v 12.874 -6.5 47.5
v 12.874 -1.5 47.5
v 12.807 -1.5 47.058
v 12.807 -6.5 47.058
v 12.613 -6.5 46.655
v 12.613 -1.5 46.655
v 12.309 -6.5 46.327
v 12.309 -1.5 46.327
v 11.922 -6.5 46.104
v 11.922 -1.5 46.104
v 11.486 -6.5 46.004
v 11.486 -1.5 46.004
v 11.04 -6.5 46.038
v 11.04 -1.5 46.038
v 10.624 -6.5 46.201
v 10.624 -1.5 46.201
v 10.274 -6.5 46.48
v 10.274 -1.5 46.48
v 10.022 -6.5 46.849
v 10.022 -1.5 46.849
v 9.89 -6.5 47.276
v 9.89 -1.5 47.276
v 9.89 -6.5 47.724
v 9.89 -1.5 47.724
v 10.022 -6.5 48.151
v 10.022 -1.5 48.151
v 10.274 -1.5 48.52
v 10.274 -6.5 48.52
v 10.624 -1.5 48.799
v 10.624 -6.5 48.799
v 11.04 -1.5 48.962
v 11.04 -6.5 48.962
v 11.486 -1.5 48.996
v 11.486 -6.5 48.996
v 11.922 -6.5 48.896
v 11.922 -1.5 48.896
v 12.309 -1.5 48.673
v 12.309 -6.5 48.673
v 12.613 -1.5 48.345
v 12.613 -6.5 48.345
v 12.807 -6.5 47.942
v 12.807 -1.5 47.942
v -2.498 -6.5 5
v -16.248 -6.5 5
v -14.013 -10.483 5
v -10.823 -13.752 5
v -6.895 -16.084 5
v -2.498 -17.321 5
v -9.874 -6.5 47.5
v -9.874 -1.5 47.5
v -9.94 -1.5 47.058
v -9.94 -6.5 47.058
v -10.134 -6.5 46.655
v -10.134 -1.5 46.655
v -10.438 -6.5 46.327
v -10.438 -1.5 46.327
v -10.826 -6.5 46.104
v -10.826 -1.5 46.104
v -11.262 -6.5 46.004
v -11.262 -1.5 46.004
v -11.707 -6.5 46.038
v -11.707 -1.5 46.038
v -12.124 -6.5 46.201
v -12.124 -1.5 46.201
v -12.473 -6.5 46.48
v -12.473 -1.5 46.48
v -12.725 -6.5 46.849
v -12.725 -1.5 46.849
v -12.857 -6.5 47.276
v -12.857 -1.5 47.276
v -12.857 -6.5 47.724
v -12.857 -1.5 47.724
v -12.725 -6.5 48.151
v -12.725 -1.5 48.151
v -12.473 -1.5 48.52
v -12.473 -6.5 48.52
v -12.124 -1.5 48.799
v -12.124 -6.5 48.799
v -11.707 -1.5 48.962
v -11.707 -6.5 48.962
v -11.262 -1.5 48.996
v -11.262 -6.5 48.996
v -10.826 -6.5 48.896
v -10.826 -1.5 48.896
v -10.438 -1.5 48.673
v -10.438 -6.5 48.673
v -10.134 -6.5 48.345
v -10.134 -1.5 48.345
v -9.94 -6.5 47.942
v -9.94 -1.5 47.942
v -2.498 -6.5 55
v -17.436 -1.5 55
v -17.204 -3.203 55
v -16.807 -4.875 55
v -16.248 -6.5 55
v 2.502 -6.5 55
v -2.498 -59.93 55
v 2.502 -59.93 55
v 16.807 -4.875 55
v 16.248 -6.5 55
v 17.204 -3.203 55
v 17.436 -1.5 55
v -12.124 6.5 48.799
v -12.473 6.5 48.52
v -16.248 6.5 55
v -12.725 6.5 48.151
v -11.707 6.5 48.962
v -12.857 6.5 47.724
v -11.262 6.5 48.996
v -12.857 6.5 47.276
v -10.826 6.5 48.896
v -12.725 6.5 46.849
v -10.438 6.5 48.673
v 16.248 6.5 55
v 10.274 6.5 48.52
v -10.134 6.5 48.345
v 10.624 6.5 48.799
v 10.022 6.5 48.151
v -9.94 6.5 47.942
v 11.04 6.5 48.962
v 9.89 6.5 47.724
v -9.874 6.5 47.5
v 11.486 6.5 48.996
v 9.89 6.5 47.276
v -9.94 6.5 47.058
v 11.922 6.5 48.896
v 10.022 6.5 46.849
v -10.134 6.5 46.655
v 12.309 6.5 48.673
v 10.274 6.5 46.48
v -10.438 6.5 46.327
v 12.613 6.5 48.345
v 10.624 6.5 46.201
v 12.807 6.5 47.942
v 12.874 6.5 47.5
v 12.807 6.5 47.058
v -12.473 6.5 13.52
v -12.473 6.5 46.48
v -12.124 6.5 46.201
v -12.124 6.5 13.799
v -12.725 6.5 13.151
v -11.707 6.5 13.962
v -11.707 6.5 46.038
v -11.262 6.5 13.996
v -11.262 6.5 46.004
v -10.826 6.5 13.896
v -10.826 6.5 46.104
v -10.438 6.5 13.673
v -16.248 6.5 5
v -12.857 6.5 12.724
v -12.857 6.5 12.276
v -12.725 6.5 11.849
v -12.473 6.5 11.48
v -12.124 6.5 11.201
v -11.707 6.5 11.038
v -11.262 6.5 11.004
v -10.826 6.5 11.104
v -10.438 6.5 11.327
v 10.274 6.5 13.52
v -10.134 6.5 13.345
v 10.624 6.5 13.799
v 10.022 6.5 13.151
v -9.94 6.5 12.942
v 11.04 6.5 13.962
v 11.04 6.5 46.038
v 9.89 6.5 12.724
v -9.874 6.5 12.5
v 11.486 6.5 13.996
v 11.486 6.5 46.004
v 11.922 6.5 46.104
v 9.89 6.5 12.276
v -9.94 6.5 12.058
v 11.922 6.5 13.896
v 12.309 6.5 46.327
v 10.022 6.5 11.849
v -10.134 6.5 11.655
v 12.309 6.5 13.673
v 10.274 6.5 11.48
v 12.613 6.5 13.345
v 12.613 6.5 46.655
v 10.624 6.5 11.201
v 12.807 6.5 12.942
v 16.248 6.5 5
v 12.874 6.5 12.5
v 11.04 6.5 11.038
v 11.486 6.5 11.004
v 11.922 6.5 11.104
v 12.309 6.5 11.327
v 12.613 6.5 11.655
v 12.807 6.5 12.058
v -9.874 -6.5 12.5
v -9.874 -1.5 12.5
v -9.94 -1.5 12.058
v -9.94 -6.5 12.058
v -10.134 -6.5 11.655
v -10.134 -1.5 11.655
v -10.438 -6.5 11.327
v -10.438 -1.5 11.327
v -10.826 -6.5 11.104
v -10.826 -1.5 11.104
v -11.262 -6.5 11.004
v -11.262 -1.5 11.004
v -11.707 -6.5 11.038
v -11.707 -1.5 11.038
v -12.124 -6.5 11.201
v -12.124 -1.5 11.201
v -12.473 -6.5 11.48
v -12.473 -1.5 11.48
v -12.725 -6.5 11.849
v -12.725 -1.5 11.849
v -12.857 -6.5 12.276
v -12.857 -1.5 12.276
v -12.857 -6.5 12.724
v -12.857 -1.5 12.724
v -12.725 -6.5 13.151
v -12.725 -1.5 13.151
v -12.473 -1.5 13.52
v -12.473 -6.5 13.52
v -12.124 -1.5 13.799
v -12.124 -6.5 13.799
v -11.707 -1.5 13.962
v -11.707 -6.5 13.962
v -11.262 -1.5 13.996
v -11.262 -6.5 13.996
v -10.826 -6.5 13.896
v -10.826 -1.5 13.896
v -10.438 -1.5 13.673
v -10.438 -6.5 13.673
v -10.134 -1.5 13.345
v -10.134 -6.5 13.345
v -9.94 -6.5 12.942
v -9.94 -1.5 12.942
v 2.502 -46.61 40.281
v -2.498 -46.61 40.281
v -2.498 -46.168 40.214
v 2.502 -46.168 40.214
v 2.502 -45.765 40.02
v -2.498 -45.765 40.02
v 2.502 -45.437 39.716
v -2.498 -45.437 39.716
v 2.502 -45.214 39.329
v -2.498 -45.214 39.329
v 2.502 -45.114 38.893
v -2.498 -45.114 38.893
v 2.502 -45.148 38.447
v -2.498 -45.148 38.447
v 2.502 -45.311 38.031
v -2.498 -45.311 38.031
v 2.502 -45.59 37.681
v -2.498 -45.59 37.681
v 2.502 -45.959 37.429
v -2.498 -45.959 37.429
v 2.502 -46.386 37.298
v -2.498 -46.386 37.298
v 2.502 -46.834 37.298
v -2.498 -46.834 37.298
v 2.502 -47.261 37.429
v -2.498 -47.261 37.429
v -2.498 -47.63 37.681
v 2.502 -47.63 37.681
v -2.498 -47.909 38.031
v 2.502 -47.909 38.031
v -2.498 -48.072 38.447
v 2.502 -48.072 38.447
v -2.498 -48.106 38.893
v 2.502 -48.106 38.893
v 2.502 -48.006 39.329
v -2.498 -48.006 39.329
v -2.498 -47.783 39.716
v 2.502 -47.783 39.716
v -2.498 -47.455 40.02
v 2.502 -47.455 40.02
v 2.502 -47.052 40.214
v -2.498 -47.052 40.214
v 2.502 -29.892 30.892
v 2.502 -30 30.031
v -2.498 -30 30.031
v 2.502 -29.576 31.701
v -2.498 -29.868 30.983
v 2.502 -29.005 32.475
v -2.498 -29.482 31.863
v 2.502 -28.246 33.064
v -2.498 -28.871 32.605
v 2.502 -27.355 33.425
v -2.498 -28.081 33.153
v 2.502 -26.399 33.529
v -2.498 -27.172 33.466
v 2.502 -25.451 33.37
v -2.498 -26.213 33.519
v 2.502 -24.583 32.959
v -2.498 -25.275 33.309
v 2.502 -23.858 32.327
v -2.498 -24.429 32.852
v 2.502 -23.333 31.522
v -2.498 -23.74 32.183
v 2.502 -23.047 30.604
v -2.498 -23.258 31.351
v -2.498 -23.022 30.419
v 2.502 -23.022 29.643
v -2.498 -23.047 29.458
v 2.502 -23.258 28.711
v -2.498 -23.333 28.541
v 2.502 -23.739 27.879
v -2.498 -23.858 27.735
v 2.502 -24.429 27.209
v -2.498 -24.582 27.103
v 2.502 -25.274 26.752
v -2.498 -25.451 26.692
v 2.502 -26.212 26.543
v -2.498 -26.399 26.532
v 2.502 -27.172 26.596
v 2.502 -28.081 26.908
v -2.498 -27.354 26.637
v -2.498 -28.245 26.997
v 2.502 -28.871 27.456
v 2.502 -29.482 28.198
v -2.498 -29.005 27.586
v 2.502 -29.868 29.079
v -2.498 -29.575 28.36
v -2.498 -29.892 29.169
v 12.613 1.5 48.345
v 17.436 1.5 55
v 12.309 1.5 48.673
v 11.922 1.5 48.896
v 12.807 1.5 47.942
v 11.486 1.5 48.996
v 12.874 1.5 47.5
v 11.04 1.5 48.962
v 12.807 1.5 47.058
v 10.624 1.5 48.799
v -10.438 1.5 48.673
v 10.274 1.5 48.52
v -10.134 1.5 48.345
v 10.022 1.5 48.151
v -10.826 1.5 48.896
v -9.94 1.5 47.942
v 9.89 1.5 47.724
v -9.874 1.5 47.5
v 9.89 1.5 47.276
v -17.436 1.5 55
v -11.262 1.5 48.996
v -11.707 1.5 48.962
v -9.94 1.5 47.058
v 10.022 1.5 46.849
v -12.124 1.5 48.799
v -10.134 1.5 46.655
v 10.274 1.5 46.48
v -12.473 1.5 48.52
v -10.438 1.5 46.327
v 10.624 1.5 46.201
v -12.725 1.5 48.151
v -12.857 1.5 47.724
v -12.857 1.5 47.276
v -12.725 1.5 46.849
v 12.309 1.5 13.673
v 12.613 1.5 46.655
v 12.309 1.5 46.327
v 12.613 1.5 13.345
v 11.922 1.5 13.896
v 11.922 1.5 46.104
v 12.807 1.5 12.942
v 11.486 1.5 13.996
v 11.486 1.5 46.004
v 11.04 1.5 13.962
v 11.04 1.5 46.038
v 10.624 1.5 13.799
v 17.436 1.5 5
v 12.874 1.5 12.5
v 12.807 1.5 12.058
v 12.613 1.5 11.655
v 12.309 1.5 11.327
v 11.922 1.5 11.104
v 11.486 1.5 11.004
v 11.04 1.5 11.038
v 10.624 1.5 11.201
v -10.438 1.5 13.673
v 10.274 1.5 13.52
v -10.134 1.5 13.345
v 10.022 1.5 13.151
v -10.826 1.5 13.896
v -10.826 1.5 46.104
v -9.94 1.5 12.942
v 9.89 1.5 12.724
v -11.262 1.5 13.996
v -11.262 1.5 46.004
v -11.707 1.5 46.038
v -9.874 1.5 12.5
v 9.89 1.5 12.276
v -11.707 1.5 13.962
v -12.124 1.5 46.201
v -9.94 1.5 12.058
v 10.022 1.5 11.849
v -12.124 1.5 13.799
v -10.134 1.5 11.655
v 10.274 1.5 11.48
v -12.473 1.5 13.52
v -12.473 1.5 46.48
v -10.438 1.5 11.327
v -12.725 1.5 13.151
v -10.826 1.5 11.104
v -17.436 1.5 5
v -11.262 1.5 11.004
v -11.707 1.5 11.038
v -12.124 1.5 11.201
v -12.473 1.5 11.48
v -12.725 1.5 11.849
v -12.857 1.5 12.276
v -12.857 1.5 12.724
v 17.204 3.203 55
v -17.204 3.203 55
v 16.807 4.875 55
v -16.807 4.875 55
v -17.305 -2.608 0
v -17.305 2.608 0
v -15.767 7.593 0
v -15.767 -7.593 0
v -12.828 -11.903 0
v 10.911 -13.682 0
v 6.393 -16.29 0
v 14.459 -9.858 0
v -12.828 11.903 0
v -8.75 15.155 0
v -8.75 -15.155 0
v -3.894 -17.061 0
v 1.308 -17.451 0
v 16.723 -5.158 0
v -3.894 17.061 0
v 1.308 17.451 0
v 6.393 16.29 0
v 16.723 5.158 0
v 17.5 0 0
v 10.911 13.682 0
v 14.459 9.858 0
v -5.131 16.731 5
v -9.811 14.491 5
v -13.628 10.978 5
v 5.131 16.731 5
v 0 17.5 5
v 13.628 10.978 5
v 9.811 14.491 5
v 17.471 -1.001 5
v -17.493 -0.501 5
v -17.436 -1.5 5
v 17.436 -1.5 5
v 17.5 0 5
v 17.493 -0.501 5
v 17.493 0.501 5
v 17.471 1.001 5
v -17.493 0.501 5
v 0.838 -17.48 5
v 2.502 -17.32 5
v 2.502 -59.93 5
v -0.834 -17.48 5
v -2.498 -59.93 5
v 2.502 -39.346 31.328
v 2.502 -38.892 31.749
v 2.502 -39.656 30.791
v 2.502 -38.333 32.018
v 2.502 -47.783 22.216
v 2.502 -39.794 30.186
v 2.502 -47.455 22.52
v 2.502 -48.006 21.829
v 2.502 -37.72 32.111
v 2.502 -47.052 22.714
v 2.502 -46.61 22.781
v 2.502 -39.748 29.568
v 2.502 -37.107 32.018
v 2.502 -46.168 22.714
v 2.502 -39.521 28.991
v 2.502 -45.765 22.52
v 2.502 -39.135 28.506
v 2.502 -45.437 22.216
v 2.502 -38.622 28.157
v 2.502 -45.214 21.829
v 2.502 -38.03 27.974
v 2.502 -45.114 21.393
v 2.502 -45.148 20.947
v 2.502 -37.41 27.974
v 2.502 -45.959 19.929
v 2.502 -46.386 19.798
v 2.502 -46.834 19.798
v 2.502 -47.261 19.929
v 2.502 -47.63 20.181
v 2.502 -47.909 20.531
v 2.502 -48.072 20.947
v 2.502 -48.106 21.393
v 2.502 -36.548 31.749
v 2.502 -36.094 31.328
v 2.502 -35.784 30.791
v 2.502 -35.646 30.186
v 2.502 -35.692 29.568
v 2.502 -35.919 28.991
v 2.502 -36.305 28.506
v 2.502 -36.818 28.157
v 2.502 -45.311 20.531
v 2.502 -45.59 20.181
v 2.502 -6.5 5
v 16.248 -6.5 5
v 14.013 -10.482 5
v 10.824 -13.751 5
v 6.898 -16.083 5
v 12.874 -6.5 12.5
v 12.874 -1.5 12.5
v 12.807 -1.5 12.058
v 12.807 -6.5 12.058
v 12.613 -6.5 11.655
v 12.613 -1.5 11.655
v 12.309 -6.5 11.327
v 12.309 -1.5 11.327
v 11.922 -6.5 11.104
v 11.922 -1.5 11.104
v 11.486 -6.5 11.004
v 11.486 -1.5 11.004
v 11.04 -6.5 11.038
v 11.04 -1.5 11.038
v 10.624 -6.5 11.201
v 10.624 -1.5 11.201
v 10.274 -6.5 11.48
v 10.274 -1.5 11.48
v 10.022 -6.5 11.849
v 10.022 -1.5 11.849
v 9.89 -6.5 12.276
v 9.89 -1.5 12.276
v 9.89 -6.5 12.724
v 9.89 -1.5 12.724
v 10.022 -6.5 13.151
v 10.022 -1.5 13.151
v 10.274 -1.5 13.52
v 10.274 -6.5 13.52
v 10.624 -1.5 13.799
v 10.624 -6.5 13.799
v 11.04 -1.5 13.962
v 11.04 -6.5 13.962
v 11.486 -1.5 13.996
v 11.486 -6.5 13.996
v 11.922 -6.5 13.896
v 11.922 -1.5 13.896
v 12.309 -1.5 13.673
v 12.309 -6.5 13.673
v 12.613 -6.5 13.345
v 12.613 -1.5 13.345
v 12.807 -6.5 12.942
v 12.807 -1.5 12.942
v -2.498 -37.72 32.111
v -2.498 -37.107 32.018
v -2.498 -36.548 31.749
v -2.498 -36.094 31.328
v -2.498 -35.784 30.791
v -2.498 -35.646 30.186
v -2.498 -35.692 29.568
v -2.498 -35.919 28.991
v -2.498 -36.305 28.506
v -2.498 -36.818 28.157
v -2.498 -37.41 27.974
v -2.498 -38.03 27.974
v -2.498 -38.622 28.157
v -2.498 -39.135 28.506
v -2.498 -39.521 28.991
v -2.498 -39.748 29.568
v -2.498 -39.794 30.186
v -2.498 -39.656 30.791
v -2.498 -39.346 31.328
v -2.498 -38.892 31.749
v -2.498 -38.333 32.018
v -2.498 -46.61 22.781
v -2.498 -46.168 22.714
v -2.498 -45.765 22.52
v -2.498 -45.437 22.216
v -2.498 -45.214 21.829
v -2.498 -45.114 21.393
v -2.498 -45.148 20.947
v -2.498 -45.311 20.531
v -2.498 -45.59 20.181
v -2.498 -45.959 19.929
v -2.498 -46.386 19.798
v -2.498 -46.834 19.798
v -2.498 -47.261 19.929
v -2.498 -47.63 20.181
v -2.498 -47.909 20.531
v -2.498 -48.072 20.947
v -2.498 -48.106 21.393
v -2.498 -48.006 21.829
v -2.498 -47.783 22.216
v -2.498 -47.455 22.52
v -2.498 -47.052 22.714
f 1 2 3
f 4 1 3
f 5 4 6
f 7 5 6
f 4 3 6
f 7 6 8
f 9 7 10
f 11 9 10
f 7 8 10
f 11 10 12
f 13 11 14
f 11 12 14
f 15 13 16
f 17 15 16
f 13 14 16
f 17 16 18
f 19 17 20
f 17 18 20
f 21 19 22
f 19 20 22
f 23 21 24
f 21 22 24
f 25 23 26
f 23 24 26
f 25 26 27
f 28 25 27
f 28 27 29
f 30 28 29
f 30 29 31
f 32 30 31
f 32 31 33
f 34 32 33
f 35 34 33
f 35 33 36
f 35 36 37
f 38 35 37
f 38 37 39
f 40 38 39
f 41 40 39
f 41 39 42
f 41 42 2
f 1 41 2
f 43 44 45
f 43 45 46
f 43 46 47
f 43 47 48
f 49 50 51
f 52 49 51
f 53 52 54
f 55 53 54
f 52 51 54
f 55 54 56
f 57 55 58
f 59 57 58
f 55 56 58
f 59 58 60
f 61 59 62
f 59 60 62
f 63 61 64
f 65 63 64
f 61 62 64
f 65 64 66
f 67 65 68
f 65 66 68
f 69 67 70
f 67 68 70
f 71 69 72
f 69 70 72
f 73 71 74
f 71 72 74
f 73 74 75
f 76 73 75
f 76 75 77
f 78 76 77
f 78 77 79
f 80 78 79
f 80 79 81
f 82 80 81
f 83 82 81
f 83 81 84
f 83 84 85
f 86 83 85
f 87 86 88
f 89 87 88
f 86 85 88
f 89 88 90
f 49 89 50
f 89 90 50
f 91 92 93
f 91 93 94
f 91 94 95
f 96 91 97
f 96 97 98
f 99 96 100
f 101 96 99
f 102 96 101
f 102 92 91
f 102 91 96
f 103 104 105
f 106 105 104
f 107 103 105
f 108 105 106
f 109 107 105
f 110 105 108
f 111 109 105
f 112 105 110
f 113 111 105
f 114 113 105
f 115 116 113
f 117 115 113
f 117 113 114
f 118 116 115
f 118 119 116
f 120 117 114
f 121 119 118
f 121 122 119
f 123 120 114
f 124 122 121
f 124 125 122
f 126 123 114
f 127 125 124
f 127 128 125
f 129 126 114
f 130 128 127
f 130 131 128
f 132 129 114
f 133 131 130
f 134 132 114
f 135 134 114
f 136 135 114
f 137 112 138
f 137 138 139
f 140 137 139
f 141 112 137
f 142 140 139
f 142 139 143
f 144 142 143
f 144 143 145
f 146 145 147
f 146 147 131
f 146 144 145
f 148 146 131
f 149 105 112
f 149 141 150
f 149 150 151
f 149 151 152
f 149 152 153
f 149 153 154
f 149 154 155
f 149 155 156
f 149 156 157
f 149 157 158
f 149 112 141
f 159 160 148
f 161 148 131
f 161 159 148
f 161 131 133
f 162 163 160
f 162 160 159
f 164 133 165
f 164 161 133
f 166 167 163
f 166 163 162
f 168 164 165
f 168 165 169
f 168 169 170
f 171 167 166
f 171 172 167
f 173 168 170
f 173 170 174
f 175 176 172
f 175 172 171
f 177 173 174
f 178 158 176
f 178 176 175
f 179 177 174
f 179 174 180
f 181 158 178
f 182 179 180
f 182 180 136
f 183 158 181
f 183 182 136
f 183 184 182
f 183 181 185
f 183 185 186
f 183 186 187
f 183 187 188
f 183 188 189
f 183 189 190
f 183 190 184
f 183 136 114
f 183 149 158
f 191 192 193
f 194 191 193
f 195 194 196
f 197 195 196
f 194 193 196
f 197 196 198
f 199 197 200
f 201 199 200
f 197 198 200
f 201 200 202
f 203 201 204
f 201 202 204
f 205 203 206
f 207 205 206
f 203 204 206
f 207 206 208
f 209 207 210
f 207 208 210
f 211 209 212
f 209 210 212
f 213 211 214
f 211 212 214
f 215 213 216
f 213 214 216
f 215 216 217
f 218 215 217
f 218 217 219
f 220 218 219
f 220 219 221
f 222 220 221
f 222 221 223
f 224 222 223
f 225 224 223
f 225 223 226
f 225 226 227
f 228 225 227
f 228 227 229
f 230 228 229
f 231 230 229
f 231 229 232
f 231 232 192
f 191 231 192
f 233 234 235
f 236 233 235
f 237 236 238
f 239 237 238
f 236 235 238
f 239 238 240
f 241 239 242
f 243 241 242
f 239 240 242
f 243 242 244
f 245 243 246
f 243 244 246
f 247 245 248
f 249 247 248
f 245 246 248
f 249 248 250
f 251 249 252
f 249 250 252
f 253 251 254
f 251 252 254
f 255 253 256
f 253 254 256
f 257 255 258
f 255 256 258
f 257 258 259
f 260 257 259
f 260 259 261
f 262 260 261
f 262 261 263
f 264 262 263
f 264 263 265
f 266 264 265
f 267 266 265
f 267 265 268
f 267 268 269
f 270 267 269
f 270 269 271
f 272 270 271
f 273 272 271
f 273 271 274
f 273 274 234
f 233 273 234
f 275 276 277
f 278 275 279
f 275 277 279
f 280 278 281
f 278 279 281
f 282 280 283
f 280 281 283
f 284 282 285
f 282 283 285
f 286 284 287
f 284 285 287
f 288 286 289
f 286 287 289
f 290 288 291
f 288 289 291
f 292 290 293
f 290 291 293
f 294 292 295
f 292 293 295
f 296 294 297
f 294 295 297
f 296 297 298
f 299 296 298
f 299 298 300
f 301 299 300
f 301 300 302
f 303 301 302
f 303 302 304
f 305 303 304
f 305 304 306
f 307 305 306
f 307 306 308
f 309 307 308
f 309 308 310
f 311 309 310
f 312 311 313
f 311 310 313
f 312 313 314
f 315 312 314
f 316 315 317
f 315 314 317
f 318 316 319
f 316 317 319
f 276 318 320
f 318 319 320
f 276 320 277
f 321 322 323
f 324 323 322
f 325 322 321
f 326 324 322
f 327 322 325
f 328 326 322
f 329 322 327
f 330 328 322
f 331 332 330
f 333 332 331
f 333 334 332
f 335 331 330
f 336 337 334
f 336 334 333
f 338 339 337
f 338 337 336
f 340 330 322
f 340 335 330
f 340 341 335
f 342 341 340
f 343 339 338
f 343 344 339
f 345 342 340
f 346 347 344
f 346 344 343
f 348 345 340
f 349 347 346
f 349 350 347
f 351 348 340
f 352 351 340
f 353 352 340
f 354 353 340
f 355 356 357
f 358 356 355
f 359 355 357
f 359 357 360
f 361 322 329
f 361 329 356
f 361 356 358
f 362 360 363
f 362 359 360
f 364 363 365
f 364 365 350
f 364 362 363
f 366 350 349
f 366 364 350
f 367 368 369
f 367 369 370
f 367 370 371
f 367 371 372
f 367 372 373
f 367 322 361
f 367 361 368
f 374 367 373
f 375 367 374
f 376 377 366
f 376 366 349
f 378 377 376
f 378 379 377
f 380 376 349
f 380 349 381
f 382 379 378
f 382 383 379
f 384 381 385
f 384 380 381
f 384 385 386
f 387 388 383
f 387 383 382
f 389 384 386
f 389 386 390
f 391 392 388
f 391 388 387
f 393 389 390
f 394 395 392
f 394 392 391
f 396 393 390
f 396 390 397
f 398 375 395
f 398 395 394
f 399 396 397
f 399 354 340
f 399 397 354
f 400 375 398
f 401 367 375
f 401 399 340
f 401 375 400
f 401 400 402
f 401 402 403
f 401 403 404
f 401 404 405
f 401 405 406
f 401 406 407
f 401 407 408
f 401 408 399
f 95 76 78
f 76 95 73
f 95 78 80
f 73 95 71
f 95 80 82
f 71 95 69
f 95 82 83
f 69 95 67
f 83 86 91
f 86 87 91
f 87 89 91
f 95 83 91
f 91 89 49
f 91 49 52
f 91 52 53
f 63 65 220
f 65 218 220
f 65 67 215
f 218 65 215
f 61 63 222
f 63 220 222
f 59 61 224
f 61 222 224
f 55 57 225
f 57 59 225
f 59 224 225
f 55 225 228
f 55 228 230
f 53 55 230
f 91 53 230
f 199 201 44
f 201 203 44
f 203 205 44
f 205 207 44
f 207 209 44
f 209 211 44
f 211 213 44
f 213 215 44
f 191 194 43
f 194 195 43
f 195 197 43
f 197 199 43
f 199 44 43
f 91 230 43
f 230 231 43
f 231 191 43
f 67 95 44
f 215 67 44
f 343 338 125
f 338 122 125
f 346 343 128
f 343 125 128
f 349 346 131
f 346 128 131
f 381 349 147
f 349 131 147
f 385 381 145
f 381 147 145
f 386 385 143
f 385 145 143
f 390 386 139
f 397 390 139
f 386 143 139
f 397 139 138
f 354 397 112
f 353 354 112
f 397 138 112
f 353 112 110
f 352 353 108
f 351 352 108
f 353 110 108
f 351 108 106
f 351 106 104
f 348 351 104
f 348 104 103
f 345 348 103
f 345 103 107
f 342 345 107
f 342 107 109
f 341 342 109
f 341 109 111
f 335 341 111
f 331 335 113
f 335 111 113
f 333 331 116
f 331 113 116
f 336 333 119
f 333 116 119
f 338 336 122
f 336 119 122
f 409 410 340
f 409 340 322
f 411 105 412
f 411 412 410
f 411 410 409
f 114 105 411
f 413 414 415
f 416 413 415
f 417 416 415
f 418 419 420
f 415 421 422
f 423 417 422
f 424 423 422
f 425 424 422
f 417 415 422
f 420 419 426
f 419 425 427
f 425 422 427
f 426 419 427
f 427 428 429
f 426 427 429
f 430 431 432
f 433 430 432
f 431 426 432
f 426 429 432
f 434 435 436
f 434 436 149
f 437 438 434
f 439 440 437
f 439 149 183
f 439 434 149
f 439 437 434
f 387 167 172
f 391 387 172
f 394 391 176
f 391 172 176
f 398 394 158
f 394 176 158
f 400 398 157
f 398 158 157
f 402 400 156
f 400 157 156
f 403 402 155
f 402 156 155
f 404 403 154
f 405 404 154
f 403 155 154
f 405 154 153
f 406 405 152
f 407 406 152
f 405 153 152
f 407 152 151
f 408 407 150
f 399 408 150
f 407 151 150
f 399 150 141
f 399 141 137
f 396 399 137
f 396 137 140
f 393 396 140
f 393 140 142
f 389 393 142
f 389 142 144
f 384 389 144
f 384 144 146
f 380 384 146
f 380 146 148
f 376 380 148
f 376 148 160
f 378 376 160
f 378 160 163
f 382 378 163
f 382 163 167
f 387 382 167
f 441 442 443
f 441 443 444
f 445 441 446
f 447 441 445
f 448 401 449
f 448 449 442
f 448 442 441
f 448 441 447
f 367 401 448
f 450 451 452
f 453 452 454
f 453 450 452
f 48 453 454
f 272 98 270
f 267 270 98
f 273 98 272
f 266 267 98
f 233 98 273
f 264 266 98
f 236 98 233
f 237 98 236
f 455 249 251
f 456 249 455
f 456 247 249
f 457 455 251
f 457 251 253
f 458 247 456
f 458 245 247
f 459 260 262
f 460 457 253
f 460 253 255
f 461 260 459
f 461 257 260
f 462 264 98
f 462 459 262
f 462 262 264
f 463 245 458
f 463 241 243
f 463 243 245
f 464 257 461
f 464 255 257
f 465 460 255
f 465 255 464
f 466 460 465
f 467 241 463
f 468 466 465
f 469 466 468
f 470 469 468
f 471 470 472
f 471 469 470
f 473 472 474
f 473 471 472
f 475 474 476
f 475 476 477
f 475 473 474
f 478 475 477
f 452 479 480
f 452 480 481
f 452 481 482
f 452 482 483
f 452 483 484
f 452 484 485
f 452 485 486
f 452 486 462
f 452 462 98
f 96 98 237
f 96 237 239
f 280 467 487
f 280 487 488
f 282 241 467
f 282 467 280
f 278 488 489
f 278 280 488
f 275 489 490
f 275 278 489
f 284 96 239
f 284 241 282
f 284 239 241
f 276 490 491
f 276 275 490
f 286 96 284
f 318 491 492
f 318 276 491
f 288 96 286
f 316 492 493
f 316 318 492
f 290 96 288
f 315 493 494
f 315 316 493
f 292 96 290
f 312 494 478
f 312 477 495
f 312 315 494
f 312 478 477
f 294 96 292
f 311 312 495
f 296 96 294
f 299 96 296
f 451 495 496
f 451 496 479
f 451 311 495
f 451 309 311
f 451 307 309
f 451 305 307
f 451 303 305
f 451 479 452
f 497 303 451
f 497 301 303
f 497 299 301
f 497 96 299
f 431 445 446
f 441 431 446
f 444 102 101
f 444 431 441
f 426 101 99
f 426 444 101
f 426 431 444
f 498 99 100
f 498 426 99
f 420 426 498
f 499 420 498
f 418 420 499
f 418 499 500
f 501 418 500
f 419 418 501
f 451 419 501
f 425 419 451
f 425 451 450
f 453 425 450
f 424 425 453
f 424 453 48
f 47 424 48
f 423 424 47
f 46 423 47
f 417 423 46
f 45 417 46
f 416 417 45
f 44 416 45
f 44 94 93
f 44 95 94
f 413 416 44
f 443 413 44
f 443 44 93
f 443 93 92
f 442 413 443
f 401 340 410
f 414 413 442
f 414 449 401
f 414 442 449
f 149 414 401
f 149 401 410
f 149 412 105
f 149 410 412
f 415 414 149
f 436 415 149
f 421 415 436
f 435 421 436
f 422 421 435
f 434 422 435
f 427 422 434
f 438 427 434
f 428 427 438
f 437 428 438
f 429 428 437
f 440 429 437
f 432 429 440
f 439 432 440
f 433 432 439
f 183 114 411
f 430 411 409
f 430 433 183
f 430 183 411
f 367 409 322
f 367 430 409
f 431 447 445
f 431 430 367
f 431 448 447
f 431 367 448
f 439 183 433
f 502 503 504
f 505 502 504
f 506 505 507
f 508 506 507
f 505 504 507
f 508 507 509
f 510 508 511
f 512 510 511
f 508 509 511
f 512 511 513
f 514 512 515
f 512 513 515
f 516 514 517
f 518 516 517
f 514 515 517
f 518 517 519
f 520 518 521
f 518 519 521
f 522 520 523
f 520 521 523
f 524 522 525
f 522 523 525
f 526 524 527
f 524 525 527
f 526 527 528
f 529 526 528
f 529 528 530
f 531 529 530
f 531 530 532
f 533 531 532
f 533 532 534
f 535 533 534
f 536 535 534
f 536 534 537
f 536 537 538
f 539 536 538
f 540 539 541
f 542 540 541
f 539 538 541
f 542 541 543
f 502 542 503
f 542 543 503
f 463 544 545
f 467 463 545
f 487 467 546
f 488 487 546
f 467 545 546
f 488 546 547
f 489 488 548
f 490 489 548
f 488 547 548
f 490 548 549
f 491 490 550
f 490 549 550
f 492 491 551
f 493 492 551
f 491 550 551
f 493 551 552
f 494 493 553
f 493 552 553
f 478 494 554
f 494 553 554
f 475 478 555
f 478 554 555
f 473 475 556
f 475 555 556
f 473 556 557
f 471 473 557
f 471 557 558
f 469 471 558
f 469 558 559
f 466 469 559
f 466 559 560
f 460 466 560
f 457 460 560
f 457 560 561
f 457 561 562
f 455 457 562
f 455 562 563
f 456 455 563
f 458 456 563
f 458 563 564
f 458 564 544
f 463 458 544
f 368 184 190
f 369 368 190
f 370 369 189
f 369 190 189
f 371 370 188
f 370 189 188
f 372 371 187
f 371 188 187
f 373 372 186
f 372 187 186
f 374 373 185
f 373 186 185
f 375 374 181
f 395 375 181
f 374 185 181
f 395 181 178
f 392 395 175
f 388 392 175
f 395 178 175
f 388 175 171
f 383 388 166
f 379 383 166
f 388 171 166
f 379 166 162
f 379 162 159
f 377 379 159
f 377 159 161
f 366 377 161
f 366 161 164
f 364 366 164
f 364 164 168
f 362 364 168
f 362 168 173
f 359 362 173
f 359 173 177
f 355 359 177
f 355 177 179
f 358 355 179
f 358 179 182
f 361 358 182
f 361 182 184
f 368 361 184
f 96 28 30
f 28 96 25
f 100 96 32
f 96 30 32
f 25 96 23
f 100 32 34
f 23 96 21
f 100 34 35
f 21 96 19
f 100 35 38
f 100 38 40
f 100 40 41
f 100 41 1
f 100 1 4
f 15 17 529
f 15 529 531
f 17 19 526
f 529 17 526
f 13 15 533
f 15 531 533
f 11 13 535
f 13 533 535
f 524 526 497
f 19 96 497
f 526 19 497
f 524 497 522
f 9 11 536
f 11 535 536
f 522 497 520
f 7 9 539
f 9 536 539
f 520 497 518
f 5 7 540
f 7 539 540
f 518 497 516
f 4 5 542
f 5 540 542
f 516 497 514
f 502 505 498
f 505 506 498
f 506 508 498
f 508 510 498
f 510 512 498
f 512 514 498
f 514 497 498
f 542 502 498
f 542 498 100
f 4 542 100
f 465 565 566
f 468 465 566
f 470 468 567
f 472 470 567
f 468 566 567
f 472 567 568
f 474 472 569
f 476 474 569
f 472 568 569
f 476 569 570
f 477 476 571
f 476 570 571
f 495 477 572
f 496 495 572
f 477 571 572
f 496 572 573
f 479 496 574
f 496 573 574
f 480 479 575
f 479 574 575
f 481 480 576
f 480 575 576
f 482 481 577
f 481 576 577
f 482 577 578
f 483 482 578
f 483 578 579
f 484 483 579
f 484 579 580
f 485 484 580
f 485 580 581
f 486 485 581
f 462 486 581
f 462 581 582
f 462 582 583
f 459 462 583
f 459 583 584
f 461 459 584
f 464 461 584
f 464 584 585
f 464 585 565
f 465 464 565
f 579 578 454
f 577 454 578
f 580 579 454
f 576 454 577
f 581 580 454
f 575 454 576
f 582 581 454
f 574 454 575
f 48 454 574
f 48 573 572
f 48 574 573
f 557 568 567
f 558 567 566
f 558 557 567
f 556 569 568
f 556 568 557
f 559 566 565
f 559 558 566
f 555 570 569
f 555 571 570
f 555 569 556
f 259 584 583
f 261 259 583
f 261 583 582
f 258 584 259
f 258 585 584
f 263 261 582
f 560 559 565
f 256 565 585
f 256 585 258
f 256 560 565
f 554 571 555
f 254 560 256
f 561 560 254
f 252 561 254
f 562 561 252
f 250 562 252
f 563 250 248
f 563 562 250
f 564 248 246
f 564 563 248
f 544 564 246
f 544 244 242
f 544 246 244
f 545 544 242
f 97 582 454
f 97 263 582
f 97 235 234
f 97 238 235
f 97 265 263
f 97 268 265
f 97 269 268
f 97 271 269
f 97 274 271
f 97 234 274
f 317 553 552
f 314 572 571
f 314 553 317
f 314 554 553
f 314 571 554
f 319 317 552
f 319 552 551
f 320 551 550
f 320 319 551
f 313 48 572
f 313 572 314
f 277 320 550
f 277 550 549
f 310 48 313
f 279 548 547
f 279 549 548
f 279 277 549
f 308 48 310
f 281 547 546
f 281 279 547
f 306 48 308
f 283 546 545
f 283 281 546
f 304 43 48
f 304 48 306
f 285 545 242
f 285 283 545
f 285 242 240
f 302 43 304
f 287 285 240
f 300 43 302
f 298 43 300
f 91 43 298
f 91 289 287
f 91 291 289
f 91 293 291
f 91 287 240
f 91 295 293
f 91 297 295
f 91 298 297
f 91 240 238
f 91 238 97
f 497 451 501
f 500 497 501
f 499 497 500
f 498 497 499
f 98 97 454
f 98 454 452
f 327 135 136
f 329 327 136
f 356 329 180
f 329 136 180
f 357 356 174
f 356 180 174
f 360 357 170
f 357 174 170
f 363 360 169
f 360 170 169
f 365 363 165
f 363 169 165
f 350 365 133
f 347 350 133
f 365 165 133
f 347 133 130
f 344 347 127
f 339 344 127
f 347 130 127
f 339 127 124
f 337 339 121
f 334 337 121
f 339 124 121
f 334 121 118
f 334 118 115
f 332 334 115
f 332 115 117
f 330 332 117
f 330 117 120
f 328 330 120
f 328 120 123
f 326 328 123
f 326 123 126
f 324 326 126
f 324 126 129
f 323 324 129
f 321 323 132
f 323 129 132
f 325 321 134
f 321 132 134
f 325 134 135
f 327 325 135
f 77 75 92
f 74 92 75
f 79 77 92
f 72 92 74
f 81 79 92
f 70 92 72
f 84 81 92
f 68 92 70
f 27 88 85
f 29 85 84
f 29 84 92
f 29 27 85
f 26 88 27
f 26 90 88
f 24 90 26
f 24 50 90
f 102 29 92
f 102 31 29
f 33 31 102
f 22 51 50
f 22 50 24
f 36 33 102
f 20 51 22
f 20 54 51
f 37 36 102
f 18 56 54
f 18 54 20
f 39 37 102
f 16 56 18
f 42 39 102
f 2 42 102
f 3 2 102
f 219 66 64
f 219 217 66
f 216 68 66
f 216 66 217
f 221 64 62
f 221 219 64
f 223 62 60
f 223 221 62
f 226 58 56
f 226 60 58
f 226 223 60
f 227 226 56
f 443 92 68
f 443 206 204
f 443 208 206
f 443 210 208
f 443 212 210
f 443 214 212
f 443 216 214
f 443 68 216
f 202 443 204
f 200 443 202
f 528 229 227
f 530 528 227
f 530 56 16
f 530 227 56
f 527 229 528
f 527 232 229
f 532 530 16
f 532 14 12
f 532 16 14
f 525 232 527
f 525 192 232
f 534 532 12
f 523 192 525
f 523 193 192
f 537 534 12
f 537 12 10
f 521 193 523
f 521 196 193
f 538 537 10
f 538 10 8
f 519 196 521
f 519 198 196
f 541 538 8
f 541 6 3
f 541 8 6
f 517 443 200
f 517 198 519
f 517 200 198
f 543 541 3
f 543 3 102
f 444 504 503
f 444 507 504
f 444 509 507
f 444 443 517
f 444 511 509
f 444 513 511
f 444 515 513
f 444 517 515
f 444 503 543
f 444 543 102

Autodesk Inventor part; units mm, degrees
ref_plane "YZ Plane" through (0, 0, 0) normal (1, 0, 0) x (0, 1, 0)
ref_plane "XZ Plane" through (0, 0, 0) normal (0, 1, 0) x (-1, 0, 0)
sketch "Sketch1" plane through (0, 0, 0) normal (0, 0, 1) x (1, 0, 0)
  circle A0 centre (0, 0) radius 17.5
  dimension "d0" = 35
extrude "Extrusion1" add sketch "Sketch1" along normal blind 5
sketch "Sketch2" plane through (0, 0, 5) normal (0, 0, 1) x (1, 0, 0)
  line L0 (25, 1.5) -> (-25, 1.5)
  line L1 (-25, 1.5) -> (-25, -1.5)
  line L2 (-25, -1.5) -> (25, -1.5)
  line L3 (25, -1.5) -> (25, 1.5)
  line L4 (25, 1.5) -> (-25, -1.5) construction
  line L5 (-25, 1.5) -> (25, -1.5) construction
  arc A0 (-8.8619, 3.6913) -> (8.9371, 3.5055) centre (0, 0) ccw projected
  circle A1 centre (0, 0) radius 17.5 projected
  circle A2 centre (0, 0) radius 17.5 projected
  line L6 (17.4356, -1.5) -> (-22.5, -1.5)
  line L7 (-22.5, -1.5) -> (-22.5, -6.5)
  line L8 (-22.5, -6.5) -> (17.4356, -6.5)
  line L9 (17.4356, -6.5) -> (17.4356, -1.5)
  line L10 (17.4356, 1.5) -> (-22.5, 1.5)
  line L11 (-22.5, 1.5) -> (-22.5, 6.5)
  line L12 (-22.5, 6.5) -> (17.4356, 6.5)
  line L13 (17.4356, 6.5) -> (17.4356, 1.5)
  point P0 (-3.75, -16.4)
  point P1 (16.2481, 6.5)
  point P2 (-16.2481, 6.5)
  point P3 (-17.4356, 1.5)
  point P4 (17.4356, 1.5)
  point P5 (16.2481, -6.5)
  point P6 (17.4356, -1.5)
  point P7 (-17.4356, -1.5)
  point P8 (-16.2481, -6.5)
  dimension "d3" = 50
  dimension "d4" = 3
  dimension "d5" = 5
  dimension "d6" = 5
extrude "Extrusion2" add sketch "Sketch2" along normal blind 50 contours L0 A1 L12 | A1 L8 A0 L2 | A0 L8 L2 | A0 L8 A1 L2
sketch "Sketch3" plane through (-16.2481, 6.5, 5) normal (0, 1, 0) x (1, 0, 0)
  line L0 (0, 0) -> (32.4962, 0) projected
  line L1 (0, 0) -> (0, -50) projected
  line L2 (32.4962, -50) -> (0, -50) projected
  line L3 (32.4962, 0) -> (32.4962, -50) projected
  line L4 (0, 0) -> (0, -50) projected
  line L5 (32.4962, 0) -> (32.4962, -50) projected
  line L6 (0, 0) -> (32.4962, -50)
  line L7 (32.4962, -50) -> (0, -50) projected
  line L8 (0, -50) -> (32.4962, 0)
  line L9 (27.6217, -7.5) -> (4.8744, -7.5)
  line L10 (4.8744, -7.5) -> (4.8744, -42.5)
  line L11 (4.8744, -42.5) -> (27.6217, -42.5)
  line L12 (27.6217, -42.5) -> (27.6217, -7.5)
  line L13 (27.6217, -7.5) -> (4.8744, -42.5) construction
  line L14 (4.8744, -7.5) -> (27.6217, -42.5) construction
  circle A0 centre (27.6217, -42.5) radius 1.5
  circle A1 centre (4.8744, -42.5) radius 1.5
  circle A2 centre (4.8744, -7.5) radius 1.5
  circle A3 centre (27.6217, -7.5) radius 1.5
  point P0 (16.2481, 5)
  point P1 (16.2481, -25)
  dimension "d9" = 35
  dimension "d10" = 3
  dimension "d11" = 3
  dimension "d12" = 3
  dimension "d13" = 3
extrude "Extrusion3" cut sketch "Sketch3" against normal through all contours A2 L9 L6 | L6 L10 A2 | A3 L12 L8 | L8 L9 A3 | A1 L10 L8 | L8 L11 A1 | L9 A2 L6 | L6 A2 L10 | A0 L11 L6 | L6 L12 A0 | L12 A3 L8 | L8 A3 L9 | L10 A1 L8 | L8 A1 L11 | L11 A0 L6 | L6 A0 L12
sketch "Sketch4" plane through (-16.2481, -6.5, 5) normal (0, -1, 0) x (1, 0, 0)
  line L0 (13.75, 50) -> (18.75, 50)
  line L1 (18.75, 50) -> (18.75, 0)
  line L2 (18.75, 0) -> (13.75, 0)
  line L3 (13.75, 0) -> (13.75, 50)
  line L4 (0, 50) -> (32.4962, 50) projected
  line L5 (32.4962, 0) -> (0, 0) projected
  line L6 (0, 0) -> (0, 50) projected
  point P0 (16.2481, -5)
  dimension "d16" = 0
  dimension "d17" = 0
  dimension "d18" = 5
  dimension "d19" = 13.75
ref_plane "Work Plane1" through (-232.5644, -49.9301, 5) normal (0, -1, 0) x (1, 0, 0)
extrude "Extrusion4" add sketch "Sketch4" along normal up to surface (43.4301 mm away) contours L0 L1 L2 L3
sketch "Sketch5" plane through (-2.4981, -6.5, 5) normal (-1, 0, 0) x (0, 0, 1)
  ellipse E0 centre (25.0308, -20) end of major axis (25.0308, -23.5) minor radius 3.5 projected
  point P0 (-5, 6.5)
extrude "Extrusion5" cut sketch "Sketch5" against normal through all
sketch "Sketch6" plane through (-2.4981, -6.5, 5) normal (-1, 0, 0) x (0, 0, 1)
  circle A0 centre (25.0308, -31.22) radius 2.08 projected
  point P0 (-5, 6.5)
extrude "Extrusion6" cut sketch "Sketch6" against normal up to surface (5 mm away)
sketch "Sketch7" plane through (-2.4981, -6.5, 5) normal (-1, 0, 0) x (0, 0, 1)
  circle A0 centre (33.7808, -40.11) radius 1.5 projected
  circle A1 centre (16.2808, -40.11) radius 1.5 projected
  point P0 (-5, 6.5)
extrude "Extrusion7" cut sketch "Sketch7" against normal blind 50
sketch "Sketch8" plane through (-2.4981, -49.9301, 5) normal (0, -1, 0) x (1, 0, 0)
  line L0 (0, 0) -> (0, 50) projected
  line L1 (5, 0) -> (0, 0) projected
  line L2 (5, 50) -> (5, 0) projected
  line L3 (0, 50) -> (5, 50) projected
  point P0 (2.4981, -5)
extrude "Extrusion8" add sketch "Sketch8" along normal blind 10
properties part number "arm - servo mount" material "PET Plastic"
